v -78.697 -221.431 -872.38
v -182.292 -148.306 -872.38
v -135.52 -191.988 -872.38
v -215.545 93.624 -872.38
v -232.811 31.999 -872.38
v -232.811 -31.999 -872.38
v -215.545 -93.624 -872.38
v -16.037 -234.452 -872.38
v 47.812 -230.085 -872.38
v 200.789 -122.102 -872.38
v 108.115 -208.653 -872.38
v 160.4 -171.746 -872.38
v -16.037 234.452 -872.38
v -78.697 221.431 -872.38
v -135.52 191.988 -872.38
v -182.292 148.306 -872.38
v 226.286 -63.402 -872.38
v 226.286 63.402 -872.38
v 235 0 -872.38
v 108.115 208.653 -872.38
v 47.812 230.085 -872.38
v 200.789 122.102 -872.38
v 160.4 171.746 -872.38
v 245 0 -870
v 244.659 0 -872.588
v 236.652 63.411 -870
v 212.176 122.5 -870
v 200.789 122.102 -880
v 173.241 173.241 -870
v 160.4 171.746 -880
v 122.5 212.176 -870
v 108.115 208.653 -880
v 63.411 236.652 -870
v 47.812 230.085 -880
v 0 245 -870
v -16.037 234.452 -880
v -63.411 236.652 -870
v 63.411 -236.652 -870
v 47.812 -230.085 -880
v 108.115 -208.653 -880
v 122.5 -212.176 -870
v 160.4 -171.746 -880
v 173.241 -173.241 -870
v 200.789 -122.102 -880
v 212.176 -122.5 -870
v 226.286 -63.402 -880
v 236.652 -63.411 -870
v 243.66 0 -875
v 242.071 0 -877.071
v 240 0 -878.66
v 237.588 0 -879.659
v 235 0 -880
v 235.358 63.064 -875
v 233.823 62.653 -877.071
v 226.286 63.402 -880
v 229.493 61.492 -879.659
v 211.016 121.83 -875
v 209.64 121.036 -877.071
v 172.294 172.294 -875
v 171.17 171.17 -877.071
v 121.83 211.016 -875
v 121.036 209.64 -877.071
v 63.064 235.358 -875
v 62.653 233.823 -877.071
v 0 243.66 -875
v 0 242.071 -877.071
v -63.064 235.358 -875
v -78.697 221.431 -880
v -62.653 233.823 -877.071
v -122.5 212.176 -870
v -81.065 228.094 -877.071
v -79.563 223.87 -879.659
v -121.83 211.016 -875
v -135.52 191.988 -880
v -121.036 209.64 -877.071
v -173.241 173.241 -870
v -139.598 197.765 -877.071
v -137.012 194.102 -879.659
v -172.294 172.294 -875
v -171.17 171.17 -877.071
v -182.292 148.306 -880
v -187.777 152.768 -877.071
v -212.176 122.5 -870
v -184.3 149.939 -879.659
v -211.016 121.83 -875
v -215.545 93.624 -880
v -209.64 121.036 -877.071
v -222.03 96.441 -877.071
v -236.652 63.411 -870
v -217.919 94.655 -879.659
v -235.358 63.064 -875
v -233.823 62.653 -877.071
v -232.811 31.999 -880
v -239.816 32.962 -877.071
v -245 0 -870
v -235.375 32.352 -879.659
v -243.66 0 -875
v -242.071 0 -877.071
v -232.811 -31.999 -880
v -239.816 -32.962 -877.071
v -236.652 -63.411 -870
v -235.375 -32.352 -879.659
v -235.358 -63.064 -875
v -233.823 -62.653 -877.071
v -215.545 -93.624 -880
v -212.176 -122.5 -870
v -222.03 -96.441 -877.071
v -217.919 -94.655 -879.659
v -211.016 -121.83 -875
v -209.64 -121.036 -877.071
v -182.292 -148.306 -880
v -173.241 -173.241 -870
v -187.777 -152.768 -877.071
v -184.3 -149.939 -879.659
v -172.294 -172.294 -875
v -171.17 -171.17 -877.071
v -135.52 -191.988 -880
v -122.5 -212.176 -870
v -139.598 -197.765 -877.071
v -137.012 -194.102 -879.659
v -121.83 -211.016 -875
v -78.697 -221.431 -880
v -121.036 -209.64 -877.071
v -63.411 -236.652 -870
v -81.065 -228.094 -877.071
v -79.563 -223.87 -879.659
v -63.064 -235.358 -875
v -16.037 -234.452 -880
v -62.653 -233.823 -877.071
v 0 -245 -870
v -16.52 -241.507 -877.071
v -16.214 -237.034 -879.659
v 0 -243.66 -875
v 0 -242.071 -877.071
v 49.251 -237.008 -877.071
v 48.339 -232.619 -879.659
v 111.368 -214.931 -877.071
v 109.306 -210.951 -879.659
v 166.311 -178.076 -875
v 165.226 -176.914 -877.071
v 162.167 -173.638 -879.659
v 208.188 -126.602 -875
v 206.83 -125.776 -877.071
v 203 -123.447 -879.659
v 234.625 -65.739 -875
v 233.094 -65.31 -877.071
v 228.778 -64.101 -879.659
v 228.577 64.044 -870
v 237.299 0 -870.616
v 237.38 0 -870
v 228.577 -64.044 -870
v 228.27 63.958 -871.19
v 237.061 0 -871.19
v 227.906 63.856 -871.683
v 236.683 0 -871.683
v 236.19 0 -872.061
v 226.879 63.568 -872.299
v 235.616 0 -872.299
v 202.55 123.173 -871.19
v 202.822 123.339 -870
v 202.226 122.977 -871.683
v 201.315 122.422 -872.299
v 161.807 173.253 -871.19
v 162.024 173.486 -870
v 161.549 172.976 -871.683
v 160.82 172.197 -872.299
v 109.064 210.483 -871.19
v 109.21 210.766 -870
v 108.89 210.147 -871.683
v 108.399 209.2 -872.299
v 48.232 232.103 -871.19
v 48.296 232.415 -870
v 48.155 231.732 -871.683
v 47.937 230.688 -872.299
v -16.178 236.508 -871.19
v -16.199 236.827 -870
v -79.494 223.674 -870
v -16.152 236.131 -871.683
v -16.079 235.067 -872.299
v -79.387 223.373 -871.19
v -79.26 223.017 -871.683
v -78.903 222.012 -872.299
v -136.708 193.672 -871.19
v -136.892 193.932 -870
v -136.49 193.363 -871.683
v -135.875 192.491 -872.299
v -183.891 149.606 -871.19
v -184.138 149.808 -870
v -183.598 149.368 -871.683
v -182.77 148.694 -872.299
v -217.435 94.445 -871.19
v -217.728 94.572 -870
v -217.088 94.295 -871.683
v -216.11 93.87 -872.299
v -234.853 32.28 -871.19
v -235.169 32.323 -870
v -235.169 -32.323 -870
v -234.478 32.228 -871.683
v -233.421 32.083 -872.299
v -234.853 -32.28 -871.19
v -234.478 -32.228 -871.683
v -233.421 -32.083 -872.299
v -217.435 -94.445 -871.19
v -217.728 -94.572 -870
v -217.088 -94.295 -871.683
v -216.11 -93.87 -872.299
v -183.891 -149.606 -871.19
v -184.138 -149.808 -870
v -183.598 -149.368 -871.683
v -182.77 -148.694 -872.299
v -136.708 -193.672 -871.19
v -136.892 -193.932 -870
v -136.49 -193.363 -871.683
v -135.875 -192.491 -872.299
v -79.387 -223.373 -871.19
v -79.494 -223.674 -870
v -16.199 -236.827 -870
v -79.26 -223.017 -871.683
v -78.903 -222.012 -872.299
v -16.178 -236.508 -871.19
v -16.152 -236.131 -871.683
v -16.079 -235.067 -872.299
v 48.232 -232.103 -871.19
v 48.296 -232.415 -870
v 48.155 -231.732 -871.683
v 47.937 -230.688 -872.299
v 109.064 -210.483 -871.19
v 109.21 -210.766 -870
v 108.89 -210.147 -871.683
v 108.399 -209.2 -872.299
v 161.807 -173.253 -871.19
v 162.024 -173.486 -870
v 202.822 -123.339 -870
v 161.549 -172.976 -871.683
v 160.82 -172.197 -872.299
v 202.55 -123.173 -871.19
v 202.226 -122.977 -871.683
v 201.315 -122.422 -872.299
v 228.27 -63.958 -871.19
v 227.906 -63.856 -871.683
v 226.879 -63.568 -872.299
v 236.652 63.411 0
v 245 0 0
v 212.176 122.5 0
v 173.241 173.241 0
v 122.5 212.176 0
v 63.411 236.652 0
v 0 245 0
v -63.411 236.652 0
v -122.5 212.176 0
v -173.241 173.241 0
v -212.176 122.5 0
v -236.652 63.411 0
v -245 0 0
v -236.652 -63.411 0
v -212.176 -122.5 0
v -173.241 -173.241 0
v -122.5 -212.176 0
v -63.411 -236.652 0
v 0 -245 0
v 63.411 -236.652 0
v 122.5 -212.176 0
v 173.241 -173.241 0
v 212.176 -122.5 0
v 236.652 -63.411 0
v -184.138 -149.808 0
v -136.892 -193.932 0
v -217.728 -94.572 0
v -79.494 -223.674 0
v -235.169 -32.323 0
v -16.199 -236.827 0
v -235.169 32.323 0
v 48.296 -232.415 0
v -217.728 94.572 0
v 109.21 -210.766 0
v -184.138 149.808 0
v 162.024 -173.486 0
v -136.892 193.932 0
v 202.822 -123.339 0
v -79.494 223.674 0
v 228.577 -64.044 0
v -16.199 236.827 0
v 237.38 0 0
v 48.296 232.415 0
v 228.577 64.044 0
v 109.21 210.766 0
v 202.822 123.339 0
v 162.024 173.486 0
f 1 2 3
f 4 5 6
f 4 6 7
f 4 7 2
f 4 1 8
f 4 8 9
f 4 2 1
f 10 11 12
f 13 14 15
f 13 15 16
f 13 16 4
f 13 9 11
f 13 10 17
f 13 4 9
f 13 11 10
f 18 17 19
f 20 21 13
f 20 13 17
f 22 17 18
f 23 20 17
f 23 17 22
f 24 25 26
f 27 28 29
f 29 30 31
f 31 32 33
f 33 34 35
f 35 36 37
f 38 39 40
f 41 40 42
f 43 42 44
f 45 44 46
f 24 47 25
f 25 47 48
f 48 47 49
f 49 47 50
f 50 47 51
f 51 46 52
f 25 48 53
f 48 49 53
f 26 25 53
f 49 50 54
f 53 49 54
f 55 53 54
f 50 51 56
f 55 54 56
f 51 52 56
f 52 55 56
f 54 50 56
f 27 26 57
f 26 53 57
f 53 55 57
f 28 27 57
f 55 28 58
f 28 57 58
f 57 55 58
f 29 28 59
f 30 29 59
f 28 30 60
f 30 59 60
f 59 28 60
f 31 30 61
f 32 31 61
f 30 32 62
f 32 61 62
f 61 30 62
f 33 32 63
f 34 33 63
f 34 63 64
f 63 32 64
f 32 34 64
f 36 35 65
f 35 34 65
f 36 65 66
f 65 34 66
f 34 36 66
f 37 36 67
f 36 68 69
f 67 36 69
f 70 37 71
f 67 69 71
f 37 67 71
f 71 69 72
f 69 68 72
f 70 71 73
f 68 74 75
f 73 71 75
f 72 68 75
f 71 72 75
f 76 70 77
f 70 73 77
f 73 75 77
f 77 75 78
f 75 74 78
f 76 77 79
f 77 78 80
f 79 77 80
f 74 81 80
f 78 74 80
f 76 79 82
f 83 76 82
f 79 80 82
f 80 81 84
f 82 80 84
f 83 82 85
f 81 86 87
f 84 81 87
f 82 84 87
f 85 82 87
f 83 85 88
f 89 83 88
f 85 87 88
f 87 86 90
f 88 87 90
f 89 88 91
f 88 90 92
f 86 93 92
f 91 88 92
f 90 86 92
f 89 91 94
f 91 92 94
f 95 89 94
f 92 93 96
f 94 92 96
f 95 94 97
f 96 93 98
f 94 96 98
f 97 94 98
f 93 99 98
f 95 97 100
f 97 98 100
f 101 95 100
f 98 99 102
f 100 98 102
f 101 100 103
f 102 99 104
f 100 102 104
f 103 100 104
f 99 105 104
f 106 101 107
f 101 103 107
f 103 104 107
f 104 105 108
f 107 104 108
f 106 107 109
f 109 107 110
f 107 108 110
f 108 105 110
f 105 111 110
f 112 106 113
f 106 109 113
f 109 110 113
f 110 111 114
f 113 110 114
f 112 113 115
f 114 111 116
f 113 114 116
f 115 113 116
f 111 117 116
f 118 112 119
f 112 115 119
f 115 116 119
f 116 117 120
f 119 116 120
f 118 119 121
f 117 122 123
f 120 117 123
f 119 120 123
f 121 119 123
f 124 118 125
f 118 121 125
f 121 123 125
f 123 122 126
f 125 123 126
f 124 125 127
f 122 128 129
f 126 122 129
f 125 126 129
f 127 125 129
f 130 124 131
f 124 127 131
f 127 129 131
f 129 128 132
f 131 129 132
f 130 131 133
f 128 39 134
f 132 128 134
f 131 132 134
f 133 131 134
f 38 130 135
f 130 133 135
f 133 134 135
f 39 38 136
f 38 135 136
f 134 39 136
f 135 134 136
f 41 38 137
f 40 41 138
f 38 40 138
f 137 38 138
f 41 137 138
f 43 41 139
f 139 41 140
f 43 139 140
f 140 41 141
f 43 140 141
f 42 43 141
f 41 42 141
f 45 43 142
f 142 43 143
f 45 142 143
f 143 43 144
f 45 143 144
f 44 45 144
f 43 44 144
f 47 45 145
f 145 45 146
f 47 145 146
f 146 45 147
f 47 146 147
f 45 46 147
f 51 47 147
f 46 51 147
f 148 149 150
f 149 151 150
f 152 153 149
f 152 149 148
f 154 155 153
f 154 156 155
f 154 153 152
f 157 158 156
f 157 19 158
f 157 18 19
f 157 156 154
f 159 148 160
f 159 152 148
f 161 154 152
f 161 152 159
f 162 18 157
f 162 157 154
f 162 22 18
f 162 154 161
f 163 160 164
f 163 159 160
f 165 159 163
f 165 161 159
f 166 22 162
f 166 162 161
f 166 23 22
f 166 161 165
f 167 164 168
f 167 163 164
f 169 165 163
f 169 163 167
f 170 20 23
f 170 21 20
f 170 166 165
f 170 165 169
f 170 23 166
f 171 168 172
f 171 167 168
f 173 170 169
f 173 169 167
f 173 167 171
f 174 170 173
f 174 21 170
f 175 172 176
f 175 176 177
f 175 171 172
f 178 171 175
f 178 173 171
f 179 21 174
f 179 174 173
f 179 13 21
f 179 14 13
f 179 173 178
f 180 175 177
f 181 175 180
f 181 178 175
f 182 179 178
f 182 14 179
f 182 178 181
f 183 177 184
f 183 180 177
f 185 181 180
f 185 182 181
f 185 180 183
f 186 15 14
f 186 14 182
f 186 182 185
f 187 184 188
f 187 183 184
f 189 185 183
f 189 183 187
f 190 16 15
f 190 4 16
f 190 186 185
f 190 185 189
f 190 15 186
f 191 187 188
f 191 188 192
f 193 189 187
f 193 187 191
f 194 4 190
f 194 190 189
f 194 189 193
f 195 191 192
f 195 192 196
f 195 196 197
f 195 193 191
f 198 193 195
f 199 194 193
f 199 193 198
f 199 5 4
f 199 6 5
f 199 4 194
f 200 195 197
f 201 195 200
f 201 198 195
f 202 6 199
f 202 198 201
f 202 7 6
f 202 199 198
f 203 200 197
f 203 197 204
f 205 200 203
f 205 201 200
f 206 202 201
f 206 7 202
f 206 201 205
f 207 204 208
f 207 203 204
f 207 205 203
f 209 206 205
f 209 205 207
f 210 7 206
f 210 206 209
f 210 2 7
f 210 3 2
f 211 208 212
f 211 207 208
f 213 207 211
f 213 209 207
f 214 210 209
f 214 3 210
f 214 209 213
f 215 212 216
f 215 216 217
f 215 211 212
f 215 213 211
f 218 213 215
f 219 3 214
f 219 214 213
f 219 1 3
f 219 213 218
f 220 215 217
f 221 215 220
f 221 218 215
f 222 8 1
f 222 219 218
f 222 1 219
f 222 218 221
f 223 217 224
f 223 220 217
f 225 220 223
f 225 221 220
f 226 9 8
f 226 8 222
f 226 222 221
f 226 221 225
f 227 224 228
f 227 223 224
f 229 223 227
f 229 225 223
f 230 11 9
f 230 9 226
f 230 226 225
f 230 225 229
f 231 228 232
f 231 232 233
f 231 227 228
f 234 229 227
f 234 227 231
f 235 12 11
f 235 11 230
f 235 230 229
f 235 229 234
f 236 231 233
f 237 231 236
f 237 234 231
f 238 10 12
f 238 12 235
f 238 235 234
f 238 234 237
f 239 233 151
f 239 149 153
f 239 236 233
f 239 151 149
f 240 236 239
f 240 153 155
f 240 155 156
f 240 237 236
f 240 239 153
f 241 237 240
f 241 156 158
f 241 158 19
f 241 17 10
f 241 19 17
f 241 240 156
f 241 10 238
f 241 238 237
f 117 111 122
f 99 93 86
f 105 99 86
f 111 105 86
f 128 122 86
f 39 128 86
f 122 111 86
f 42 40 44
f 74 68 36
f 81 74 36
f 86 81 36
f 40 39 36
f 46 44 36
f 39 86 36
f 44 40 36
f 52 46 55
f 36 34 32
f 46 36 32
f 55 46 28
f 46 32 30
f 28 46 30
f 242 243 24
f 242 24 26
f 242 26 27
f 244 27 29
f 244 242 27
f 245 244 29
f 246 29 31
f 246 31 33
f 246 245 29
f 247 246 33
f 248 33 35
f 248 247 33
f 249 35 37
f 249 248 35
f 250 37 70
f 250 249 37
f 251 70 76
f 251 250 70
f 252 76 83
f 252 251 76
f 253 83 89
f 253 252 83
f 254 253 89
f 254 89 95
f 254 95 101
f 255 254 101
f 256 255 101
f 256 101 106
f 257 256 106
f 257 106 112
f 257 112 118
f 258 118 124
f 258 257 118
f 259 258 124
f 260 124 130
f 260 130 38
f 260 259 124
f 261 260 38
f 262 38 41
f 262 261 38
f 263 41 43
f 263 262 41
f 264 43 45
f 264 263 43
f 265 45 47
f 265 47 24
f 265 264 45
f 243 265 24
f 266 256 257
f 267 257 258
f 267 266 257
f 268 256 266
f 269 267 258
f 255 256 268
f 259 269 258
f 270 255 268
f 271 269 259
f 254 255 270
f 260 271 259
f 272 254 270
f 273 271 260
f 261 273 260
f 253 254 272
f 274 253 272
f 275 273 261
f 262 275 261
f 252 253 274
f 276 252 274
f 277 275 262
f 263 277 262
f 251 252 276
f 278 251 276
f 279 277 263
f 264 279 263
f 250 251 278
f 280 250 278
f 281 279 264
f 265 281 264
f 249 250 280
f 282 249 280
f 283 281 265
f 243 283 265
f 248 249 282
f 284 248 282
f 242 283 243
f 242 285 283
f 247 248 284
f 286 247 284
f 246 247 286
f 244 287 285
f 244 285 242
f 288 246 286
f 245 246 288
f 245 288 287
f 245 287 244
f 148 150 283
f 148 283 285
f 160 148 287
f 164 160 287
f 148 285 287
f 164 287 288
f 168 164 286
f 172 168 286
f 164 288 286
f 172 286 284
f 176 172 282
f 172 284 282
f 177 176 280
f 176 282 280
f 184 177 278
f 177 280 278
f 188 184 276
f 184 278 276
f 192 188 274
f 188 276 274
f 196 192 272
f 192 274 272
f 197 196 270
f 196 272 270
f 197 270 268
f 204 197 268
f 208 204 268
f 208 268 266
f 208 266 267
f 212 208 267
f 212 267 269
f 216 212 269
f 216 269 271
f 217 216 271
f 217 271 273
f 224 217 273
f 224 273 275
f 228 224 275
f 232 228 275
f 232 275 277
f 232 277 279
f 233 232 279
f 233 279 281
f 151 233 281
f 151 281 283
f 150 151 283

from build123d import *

# Parameters (mm, degrees)
F0_R     = 245
F1_DEPTH = 880
F2_R     = 10
F3_T     = -7.62


with BuildPart() as f1:
    # F0 (on Top) → F1 (new body)
    with BuildSketch(Plane.XY):
        Circle(F0_R)
    extrude(amount=-F1_DEPTH)

    # F2
    f2_edges = [f1.edges().sort_by_distance(p)[0] for p in [
        (-245, 0, -880),
    ]]
    fillet(f2_edges, radius=F2_R)

    # F3
    f3_openings = [f1.faces().sort_by_distance(p)[0] for p in [
        (0, 0, 0),
    ]]
    offset(amount=F3_T, openings=f3_openings)


solid = f1.part
